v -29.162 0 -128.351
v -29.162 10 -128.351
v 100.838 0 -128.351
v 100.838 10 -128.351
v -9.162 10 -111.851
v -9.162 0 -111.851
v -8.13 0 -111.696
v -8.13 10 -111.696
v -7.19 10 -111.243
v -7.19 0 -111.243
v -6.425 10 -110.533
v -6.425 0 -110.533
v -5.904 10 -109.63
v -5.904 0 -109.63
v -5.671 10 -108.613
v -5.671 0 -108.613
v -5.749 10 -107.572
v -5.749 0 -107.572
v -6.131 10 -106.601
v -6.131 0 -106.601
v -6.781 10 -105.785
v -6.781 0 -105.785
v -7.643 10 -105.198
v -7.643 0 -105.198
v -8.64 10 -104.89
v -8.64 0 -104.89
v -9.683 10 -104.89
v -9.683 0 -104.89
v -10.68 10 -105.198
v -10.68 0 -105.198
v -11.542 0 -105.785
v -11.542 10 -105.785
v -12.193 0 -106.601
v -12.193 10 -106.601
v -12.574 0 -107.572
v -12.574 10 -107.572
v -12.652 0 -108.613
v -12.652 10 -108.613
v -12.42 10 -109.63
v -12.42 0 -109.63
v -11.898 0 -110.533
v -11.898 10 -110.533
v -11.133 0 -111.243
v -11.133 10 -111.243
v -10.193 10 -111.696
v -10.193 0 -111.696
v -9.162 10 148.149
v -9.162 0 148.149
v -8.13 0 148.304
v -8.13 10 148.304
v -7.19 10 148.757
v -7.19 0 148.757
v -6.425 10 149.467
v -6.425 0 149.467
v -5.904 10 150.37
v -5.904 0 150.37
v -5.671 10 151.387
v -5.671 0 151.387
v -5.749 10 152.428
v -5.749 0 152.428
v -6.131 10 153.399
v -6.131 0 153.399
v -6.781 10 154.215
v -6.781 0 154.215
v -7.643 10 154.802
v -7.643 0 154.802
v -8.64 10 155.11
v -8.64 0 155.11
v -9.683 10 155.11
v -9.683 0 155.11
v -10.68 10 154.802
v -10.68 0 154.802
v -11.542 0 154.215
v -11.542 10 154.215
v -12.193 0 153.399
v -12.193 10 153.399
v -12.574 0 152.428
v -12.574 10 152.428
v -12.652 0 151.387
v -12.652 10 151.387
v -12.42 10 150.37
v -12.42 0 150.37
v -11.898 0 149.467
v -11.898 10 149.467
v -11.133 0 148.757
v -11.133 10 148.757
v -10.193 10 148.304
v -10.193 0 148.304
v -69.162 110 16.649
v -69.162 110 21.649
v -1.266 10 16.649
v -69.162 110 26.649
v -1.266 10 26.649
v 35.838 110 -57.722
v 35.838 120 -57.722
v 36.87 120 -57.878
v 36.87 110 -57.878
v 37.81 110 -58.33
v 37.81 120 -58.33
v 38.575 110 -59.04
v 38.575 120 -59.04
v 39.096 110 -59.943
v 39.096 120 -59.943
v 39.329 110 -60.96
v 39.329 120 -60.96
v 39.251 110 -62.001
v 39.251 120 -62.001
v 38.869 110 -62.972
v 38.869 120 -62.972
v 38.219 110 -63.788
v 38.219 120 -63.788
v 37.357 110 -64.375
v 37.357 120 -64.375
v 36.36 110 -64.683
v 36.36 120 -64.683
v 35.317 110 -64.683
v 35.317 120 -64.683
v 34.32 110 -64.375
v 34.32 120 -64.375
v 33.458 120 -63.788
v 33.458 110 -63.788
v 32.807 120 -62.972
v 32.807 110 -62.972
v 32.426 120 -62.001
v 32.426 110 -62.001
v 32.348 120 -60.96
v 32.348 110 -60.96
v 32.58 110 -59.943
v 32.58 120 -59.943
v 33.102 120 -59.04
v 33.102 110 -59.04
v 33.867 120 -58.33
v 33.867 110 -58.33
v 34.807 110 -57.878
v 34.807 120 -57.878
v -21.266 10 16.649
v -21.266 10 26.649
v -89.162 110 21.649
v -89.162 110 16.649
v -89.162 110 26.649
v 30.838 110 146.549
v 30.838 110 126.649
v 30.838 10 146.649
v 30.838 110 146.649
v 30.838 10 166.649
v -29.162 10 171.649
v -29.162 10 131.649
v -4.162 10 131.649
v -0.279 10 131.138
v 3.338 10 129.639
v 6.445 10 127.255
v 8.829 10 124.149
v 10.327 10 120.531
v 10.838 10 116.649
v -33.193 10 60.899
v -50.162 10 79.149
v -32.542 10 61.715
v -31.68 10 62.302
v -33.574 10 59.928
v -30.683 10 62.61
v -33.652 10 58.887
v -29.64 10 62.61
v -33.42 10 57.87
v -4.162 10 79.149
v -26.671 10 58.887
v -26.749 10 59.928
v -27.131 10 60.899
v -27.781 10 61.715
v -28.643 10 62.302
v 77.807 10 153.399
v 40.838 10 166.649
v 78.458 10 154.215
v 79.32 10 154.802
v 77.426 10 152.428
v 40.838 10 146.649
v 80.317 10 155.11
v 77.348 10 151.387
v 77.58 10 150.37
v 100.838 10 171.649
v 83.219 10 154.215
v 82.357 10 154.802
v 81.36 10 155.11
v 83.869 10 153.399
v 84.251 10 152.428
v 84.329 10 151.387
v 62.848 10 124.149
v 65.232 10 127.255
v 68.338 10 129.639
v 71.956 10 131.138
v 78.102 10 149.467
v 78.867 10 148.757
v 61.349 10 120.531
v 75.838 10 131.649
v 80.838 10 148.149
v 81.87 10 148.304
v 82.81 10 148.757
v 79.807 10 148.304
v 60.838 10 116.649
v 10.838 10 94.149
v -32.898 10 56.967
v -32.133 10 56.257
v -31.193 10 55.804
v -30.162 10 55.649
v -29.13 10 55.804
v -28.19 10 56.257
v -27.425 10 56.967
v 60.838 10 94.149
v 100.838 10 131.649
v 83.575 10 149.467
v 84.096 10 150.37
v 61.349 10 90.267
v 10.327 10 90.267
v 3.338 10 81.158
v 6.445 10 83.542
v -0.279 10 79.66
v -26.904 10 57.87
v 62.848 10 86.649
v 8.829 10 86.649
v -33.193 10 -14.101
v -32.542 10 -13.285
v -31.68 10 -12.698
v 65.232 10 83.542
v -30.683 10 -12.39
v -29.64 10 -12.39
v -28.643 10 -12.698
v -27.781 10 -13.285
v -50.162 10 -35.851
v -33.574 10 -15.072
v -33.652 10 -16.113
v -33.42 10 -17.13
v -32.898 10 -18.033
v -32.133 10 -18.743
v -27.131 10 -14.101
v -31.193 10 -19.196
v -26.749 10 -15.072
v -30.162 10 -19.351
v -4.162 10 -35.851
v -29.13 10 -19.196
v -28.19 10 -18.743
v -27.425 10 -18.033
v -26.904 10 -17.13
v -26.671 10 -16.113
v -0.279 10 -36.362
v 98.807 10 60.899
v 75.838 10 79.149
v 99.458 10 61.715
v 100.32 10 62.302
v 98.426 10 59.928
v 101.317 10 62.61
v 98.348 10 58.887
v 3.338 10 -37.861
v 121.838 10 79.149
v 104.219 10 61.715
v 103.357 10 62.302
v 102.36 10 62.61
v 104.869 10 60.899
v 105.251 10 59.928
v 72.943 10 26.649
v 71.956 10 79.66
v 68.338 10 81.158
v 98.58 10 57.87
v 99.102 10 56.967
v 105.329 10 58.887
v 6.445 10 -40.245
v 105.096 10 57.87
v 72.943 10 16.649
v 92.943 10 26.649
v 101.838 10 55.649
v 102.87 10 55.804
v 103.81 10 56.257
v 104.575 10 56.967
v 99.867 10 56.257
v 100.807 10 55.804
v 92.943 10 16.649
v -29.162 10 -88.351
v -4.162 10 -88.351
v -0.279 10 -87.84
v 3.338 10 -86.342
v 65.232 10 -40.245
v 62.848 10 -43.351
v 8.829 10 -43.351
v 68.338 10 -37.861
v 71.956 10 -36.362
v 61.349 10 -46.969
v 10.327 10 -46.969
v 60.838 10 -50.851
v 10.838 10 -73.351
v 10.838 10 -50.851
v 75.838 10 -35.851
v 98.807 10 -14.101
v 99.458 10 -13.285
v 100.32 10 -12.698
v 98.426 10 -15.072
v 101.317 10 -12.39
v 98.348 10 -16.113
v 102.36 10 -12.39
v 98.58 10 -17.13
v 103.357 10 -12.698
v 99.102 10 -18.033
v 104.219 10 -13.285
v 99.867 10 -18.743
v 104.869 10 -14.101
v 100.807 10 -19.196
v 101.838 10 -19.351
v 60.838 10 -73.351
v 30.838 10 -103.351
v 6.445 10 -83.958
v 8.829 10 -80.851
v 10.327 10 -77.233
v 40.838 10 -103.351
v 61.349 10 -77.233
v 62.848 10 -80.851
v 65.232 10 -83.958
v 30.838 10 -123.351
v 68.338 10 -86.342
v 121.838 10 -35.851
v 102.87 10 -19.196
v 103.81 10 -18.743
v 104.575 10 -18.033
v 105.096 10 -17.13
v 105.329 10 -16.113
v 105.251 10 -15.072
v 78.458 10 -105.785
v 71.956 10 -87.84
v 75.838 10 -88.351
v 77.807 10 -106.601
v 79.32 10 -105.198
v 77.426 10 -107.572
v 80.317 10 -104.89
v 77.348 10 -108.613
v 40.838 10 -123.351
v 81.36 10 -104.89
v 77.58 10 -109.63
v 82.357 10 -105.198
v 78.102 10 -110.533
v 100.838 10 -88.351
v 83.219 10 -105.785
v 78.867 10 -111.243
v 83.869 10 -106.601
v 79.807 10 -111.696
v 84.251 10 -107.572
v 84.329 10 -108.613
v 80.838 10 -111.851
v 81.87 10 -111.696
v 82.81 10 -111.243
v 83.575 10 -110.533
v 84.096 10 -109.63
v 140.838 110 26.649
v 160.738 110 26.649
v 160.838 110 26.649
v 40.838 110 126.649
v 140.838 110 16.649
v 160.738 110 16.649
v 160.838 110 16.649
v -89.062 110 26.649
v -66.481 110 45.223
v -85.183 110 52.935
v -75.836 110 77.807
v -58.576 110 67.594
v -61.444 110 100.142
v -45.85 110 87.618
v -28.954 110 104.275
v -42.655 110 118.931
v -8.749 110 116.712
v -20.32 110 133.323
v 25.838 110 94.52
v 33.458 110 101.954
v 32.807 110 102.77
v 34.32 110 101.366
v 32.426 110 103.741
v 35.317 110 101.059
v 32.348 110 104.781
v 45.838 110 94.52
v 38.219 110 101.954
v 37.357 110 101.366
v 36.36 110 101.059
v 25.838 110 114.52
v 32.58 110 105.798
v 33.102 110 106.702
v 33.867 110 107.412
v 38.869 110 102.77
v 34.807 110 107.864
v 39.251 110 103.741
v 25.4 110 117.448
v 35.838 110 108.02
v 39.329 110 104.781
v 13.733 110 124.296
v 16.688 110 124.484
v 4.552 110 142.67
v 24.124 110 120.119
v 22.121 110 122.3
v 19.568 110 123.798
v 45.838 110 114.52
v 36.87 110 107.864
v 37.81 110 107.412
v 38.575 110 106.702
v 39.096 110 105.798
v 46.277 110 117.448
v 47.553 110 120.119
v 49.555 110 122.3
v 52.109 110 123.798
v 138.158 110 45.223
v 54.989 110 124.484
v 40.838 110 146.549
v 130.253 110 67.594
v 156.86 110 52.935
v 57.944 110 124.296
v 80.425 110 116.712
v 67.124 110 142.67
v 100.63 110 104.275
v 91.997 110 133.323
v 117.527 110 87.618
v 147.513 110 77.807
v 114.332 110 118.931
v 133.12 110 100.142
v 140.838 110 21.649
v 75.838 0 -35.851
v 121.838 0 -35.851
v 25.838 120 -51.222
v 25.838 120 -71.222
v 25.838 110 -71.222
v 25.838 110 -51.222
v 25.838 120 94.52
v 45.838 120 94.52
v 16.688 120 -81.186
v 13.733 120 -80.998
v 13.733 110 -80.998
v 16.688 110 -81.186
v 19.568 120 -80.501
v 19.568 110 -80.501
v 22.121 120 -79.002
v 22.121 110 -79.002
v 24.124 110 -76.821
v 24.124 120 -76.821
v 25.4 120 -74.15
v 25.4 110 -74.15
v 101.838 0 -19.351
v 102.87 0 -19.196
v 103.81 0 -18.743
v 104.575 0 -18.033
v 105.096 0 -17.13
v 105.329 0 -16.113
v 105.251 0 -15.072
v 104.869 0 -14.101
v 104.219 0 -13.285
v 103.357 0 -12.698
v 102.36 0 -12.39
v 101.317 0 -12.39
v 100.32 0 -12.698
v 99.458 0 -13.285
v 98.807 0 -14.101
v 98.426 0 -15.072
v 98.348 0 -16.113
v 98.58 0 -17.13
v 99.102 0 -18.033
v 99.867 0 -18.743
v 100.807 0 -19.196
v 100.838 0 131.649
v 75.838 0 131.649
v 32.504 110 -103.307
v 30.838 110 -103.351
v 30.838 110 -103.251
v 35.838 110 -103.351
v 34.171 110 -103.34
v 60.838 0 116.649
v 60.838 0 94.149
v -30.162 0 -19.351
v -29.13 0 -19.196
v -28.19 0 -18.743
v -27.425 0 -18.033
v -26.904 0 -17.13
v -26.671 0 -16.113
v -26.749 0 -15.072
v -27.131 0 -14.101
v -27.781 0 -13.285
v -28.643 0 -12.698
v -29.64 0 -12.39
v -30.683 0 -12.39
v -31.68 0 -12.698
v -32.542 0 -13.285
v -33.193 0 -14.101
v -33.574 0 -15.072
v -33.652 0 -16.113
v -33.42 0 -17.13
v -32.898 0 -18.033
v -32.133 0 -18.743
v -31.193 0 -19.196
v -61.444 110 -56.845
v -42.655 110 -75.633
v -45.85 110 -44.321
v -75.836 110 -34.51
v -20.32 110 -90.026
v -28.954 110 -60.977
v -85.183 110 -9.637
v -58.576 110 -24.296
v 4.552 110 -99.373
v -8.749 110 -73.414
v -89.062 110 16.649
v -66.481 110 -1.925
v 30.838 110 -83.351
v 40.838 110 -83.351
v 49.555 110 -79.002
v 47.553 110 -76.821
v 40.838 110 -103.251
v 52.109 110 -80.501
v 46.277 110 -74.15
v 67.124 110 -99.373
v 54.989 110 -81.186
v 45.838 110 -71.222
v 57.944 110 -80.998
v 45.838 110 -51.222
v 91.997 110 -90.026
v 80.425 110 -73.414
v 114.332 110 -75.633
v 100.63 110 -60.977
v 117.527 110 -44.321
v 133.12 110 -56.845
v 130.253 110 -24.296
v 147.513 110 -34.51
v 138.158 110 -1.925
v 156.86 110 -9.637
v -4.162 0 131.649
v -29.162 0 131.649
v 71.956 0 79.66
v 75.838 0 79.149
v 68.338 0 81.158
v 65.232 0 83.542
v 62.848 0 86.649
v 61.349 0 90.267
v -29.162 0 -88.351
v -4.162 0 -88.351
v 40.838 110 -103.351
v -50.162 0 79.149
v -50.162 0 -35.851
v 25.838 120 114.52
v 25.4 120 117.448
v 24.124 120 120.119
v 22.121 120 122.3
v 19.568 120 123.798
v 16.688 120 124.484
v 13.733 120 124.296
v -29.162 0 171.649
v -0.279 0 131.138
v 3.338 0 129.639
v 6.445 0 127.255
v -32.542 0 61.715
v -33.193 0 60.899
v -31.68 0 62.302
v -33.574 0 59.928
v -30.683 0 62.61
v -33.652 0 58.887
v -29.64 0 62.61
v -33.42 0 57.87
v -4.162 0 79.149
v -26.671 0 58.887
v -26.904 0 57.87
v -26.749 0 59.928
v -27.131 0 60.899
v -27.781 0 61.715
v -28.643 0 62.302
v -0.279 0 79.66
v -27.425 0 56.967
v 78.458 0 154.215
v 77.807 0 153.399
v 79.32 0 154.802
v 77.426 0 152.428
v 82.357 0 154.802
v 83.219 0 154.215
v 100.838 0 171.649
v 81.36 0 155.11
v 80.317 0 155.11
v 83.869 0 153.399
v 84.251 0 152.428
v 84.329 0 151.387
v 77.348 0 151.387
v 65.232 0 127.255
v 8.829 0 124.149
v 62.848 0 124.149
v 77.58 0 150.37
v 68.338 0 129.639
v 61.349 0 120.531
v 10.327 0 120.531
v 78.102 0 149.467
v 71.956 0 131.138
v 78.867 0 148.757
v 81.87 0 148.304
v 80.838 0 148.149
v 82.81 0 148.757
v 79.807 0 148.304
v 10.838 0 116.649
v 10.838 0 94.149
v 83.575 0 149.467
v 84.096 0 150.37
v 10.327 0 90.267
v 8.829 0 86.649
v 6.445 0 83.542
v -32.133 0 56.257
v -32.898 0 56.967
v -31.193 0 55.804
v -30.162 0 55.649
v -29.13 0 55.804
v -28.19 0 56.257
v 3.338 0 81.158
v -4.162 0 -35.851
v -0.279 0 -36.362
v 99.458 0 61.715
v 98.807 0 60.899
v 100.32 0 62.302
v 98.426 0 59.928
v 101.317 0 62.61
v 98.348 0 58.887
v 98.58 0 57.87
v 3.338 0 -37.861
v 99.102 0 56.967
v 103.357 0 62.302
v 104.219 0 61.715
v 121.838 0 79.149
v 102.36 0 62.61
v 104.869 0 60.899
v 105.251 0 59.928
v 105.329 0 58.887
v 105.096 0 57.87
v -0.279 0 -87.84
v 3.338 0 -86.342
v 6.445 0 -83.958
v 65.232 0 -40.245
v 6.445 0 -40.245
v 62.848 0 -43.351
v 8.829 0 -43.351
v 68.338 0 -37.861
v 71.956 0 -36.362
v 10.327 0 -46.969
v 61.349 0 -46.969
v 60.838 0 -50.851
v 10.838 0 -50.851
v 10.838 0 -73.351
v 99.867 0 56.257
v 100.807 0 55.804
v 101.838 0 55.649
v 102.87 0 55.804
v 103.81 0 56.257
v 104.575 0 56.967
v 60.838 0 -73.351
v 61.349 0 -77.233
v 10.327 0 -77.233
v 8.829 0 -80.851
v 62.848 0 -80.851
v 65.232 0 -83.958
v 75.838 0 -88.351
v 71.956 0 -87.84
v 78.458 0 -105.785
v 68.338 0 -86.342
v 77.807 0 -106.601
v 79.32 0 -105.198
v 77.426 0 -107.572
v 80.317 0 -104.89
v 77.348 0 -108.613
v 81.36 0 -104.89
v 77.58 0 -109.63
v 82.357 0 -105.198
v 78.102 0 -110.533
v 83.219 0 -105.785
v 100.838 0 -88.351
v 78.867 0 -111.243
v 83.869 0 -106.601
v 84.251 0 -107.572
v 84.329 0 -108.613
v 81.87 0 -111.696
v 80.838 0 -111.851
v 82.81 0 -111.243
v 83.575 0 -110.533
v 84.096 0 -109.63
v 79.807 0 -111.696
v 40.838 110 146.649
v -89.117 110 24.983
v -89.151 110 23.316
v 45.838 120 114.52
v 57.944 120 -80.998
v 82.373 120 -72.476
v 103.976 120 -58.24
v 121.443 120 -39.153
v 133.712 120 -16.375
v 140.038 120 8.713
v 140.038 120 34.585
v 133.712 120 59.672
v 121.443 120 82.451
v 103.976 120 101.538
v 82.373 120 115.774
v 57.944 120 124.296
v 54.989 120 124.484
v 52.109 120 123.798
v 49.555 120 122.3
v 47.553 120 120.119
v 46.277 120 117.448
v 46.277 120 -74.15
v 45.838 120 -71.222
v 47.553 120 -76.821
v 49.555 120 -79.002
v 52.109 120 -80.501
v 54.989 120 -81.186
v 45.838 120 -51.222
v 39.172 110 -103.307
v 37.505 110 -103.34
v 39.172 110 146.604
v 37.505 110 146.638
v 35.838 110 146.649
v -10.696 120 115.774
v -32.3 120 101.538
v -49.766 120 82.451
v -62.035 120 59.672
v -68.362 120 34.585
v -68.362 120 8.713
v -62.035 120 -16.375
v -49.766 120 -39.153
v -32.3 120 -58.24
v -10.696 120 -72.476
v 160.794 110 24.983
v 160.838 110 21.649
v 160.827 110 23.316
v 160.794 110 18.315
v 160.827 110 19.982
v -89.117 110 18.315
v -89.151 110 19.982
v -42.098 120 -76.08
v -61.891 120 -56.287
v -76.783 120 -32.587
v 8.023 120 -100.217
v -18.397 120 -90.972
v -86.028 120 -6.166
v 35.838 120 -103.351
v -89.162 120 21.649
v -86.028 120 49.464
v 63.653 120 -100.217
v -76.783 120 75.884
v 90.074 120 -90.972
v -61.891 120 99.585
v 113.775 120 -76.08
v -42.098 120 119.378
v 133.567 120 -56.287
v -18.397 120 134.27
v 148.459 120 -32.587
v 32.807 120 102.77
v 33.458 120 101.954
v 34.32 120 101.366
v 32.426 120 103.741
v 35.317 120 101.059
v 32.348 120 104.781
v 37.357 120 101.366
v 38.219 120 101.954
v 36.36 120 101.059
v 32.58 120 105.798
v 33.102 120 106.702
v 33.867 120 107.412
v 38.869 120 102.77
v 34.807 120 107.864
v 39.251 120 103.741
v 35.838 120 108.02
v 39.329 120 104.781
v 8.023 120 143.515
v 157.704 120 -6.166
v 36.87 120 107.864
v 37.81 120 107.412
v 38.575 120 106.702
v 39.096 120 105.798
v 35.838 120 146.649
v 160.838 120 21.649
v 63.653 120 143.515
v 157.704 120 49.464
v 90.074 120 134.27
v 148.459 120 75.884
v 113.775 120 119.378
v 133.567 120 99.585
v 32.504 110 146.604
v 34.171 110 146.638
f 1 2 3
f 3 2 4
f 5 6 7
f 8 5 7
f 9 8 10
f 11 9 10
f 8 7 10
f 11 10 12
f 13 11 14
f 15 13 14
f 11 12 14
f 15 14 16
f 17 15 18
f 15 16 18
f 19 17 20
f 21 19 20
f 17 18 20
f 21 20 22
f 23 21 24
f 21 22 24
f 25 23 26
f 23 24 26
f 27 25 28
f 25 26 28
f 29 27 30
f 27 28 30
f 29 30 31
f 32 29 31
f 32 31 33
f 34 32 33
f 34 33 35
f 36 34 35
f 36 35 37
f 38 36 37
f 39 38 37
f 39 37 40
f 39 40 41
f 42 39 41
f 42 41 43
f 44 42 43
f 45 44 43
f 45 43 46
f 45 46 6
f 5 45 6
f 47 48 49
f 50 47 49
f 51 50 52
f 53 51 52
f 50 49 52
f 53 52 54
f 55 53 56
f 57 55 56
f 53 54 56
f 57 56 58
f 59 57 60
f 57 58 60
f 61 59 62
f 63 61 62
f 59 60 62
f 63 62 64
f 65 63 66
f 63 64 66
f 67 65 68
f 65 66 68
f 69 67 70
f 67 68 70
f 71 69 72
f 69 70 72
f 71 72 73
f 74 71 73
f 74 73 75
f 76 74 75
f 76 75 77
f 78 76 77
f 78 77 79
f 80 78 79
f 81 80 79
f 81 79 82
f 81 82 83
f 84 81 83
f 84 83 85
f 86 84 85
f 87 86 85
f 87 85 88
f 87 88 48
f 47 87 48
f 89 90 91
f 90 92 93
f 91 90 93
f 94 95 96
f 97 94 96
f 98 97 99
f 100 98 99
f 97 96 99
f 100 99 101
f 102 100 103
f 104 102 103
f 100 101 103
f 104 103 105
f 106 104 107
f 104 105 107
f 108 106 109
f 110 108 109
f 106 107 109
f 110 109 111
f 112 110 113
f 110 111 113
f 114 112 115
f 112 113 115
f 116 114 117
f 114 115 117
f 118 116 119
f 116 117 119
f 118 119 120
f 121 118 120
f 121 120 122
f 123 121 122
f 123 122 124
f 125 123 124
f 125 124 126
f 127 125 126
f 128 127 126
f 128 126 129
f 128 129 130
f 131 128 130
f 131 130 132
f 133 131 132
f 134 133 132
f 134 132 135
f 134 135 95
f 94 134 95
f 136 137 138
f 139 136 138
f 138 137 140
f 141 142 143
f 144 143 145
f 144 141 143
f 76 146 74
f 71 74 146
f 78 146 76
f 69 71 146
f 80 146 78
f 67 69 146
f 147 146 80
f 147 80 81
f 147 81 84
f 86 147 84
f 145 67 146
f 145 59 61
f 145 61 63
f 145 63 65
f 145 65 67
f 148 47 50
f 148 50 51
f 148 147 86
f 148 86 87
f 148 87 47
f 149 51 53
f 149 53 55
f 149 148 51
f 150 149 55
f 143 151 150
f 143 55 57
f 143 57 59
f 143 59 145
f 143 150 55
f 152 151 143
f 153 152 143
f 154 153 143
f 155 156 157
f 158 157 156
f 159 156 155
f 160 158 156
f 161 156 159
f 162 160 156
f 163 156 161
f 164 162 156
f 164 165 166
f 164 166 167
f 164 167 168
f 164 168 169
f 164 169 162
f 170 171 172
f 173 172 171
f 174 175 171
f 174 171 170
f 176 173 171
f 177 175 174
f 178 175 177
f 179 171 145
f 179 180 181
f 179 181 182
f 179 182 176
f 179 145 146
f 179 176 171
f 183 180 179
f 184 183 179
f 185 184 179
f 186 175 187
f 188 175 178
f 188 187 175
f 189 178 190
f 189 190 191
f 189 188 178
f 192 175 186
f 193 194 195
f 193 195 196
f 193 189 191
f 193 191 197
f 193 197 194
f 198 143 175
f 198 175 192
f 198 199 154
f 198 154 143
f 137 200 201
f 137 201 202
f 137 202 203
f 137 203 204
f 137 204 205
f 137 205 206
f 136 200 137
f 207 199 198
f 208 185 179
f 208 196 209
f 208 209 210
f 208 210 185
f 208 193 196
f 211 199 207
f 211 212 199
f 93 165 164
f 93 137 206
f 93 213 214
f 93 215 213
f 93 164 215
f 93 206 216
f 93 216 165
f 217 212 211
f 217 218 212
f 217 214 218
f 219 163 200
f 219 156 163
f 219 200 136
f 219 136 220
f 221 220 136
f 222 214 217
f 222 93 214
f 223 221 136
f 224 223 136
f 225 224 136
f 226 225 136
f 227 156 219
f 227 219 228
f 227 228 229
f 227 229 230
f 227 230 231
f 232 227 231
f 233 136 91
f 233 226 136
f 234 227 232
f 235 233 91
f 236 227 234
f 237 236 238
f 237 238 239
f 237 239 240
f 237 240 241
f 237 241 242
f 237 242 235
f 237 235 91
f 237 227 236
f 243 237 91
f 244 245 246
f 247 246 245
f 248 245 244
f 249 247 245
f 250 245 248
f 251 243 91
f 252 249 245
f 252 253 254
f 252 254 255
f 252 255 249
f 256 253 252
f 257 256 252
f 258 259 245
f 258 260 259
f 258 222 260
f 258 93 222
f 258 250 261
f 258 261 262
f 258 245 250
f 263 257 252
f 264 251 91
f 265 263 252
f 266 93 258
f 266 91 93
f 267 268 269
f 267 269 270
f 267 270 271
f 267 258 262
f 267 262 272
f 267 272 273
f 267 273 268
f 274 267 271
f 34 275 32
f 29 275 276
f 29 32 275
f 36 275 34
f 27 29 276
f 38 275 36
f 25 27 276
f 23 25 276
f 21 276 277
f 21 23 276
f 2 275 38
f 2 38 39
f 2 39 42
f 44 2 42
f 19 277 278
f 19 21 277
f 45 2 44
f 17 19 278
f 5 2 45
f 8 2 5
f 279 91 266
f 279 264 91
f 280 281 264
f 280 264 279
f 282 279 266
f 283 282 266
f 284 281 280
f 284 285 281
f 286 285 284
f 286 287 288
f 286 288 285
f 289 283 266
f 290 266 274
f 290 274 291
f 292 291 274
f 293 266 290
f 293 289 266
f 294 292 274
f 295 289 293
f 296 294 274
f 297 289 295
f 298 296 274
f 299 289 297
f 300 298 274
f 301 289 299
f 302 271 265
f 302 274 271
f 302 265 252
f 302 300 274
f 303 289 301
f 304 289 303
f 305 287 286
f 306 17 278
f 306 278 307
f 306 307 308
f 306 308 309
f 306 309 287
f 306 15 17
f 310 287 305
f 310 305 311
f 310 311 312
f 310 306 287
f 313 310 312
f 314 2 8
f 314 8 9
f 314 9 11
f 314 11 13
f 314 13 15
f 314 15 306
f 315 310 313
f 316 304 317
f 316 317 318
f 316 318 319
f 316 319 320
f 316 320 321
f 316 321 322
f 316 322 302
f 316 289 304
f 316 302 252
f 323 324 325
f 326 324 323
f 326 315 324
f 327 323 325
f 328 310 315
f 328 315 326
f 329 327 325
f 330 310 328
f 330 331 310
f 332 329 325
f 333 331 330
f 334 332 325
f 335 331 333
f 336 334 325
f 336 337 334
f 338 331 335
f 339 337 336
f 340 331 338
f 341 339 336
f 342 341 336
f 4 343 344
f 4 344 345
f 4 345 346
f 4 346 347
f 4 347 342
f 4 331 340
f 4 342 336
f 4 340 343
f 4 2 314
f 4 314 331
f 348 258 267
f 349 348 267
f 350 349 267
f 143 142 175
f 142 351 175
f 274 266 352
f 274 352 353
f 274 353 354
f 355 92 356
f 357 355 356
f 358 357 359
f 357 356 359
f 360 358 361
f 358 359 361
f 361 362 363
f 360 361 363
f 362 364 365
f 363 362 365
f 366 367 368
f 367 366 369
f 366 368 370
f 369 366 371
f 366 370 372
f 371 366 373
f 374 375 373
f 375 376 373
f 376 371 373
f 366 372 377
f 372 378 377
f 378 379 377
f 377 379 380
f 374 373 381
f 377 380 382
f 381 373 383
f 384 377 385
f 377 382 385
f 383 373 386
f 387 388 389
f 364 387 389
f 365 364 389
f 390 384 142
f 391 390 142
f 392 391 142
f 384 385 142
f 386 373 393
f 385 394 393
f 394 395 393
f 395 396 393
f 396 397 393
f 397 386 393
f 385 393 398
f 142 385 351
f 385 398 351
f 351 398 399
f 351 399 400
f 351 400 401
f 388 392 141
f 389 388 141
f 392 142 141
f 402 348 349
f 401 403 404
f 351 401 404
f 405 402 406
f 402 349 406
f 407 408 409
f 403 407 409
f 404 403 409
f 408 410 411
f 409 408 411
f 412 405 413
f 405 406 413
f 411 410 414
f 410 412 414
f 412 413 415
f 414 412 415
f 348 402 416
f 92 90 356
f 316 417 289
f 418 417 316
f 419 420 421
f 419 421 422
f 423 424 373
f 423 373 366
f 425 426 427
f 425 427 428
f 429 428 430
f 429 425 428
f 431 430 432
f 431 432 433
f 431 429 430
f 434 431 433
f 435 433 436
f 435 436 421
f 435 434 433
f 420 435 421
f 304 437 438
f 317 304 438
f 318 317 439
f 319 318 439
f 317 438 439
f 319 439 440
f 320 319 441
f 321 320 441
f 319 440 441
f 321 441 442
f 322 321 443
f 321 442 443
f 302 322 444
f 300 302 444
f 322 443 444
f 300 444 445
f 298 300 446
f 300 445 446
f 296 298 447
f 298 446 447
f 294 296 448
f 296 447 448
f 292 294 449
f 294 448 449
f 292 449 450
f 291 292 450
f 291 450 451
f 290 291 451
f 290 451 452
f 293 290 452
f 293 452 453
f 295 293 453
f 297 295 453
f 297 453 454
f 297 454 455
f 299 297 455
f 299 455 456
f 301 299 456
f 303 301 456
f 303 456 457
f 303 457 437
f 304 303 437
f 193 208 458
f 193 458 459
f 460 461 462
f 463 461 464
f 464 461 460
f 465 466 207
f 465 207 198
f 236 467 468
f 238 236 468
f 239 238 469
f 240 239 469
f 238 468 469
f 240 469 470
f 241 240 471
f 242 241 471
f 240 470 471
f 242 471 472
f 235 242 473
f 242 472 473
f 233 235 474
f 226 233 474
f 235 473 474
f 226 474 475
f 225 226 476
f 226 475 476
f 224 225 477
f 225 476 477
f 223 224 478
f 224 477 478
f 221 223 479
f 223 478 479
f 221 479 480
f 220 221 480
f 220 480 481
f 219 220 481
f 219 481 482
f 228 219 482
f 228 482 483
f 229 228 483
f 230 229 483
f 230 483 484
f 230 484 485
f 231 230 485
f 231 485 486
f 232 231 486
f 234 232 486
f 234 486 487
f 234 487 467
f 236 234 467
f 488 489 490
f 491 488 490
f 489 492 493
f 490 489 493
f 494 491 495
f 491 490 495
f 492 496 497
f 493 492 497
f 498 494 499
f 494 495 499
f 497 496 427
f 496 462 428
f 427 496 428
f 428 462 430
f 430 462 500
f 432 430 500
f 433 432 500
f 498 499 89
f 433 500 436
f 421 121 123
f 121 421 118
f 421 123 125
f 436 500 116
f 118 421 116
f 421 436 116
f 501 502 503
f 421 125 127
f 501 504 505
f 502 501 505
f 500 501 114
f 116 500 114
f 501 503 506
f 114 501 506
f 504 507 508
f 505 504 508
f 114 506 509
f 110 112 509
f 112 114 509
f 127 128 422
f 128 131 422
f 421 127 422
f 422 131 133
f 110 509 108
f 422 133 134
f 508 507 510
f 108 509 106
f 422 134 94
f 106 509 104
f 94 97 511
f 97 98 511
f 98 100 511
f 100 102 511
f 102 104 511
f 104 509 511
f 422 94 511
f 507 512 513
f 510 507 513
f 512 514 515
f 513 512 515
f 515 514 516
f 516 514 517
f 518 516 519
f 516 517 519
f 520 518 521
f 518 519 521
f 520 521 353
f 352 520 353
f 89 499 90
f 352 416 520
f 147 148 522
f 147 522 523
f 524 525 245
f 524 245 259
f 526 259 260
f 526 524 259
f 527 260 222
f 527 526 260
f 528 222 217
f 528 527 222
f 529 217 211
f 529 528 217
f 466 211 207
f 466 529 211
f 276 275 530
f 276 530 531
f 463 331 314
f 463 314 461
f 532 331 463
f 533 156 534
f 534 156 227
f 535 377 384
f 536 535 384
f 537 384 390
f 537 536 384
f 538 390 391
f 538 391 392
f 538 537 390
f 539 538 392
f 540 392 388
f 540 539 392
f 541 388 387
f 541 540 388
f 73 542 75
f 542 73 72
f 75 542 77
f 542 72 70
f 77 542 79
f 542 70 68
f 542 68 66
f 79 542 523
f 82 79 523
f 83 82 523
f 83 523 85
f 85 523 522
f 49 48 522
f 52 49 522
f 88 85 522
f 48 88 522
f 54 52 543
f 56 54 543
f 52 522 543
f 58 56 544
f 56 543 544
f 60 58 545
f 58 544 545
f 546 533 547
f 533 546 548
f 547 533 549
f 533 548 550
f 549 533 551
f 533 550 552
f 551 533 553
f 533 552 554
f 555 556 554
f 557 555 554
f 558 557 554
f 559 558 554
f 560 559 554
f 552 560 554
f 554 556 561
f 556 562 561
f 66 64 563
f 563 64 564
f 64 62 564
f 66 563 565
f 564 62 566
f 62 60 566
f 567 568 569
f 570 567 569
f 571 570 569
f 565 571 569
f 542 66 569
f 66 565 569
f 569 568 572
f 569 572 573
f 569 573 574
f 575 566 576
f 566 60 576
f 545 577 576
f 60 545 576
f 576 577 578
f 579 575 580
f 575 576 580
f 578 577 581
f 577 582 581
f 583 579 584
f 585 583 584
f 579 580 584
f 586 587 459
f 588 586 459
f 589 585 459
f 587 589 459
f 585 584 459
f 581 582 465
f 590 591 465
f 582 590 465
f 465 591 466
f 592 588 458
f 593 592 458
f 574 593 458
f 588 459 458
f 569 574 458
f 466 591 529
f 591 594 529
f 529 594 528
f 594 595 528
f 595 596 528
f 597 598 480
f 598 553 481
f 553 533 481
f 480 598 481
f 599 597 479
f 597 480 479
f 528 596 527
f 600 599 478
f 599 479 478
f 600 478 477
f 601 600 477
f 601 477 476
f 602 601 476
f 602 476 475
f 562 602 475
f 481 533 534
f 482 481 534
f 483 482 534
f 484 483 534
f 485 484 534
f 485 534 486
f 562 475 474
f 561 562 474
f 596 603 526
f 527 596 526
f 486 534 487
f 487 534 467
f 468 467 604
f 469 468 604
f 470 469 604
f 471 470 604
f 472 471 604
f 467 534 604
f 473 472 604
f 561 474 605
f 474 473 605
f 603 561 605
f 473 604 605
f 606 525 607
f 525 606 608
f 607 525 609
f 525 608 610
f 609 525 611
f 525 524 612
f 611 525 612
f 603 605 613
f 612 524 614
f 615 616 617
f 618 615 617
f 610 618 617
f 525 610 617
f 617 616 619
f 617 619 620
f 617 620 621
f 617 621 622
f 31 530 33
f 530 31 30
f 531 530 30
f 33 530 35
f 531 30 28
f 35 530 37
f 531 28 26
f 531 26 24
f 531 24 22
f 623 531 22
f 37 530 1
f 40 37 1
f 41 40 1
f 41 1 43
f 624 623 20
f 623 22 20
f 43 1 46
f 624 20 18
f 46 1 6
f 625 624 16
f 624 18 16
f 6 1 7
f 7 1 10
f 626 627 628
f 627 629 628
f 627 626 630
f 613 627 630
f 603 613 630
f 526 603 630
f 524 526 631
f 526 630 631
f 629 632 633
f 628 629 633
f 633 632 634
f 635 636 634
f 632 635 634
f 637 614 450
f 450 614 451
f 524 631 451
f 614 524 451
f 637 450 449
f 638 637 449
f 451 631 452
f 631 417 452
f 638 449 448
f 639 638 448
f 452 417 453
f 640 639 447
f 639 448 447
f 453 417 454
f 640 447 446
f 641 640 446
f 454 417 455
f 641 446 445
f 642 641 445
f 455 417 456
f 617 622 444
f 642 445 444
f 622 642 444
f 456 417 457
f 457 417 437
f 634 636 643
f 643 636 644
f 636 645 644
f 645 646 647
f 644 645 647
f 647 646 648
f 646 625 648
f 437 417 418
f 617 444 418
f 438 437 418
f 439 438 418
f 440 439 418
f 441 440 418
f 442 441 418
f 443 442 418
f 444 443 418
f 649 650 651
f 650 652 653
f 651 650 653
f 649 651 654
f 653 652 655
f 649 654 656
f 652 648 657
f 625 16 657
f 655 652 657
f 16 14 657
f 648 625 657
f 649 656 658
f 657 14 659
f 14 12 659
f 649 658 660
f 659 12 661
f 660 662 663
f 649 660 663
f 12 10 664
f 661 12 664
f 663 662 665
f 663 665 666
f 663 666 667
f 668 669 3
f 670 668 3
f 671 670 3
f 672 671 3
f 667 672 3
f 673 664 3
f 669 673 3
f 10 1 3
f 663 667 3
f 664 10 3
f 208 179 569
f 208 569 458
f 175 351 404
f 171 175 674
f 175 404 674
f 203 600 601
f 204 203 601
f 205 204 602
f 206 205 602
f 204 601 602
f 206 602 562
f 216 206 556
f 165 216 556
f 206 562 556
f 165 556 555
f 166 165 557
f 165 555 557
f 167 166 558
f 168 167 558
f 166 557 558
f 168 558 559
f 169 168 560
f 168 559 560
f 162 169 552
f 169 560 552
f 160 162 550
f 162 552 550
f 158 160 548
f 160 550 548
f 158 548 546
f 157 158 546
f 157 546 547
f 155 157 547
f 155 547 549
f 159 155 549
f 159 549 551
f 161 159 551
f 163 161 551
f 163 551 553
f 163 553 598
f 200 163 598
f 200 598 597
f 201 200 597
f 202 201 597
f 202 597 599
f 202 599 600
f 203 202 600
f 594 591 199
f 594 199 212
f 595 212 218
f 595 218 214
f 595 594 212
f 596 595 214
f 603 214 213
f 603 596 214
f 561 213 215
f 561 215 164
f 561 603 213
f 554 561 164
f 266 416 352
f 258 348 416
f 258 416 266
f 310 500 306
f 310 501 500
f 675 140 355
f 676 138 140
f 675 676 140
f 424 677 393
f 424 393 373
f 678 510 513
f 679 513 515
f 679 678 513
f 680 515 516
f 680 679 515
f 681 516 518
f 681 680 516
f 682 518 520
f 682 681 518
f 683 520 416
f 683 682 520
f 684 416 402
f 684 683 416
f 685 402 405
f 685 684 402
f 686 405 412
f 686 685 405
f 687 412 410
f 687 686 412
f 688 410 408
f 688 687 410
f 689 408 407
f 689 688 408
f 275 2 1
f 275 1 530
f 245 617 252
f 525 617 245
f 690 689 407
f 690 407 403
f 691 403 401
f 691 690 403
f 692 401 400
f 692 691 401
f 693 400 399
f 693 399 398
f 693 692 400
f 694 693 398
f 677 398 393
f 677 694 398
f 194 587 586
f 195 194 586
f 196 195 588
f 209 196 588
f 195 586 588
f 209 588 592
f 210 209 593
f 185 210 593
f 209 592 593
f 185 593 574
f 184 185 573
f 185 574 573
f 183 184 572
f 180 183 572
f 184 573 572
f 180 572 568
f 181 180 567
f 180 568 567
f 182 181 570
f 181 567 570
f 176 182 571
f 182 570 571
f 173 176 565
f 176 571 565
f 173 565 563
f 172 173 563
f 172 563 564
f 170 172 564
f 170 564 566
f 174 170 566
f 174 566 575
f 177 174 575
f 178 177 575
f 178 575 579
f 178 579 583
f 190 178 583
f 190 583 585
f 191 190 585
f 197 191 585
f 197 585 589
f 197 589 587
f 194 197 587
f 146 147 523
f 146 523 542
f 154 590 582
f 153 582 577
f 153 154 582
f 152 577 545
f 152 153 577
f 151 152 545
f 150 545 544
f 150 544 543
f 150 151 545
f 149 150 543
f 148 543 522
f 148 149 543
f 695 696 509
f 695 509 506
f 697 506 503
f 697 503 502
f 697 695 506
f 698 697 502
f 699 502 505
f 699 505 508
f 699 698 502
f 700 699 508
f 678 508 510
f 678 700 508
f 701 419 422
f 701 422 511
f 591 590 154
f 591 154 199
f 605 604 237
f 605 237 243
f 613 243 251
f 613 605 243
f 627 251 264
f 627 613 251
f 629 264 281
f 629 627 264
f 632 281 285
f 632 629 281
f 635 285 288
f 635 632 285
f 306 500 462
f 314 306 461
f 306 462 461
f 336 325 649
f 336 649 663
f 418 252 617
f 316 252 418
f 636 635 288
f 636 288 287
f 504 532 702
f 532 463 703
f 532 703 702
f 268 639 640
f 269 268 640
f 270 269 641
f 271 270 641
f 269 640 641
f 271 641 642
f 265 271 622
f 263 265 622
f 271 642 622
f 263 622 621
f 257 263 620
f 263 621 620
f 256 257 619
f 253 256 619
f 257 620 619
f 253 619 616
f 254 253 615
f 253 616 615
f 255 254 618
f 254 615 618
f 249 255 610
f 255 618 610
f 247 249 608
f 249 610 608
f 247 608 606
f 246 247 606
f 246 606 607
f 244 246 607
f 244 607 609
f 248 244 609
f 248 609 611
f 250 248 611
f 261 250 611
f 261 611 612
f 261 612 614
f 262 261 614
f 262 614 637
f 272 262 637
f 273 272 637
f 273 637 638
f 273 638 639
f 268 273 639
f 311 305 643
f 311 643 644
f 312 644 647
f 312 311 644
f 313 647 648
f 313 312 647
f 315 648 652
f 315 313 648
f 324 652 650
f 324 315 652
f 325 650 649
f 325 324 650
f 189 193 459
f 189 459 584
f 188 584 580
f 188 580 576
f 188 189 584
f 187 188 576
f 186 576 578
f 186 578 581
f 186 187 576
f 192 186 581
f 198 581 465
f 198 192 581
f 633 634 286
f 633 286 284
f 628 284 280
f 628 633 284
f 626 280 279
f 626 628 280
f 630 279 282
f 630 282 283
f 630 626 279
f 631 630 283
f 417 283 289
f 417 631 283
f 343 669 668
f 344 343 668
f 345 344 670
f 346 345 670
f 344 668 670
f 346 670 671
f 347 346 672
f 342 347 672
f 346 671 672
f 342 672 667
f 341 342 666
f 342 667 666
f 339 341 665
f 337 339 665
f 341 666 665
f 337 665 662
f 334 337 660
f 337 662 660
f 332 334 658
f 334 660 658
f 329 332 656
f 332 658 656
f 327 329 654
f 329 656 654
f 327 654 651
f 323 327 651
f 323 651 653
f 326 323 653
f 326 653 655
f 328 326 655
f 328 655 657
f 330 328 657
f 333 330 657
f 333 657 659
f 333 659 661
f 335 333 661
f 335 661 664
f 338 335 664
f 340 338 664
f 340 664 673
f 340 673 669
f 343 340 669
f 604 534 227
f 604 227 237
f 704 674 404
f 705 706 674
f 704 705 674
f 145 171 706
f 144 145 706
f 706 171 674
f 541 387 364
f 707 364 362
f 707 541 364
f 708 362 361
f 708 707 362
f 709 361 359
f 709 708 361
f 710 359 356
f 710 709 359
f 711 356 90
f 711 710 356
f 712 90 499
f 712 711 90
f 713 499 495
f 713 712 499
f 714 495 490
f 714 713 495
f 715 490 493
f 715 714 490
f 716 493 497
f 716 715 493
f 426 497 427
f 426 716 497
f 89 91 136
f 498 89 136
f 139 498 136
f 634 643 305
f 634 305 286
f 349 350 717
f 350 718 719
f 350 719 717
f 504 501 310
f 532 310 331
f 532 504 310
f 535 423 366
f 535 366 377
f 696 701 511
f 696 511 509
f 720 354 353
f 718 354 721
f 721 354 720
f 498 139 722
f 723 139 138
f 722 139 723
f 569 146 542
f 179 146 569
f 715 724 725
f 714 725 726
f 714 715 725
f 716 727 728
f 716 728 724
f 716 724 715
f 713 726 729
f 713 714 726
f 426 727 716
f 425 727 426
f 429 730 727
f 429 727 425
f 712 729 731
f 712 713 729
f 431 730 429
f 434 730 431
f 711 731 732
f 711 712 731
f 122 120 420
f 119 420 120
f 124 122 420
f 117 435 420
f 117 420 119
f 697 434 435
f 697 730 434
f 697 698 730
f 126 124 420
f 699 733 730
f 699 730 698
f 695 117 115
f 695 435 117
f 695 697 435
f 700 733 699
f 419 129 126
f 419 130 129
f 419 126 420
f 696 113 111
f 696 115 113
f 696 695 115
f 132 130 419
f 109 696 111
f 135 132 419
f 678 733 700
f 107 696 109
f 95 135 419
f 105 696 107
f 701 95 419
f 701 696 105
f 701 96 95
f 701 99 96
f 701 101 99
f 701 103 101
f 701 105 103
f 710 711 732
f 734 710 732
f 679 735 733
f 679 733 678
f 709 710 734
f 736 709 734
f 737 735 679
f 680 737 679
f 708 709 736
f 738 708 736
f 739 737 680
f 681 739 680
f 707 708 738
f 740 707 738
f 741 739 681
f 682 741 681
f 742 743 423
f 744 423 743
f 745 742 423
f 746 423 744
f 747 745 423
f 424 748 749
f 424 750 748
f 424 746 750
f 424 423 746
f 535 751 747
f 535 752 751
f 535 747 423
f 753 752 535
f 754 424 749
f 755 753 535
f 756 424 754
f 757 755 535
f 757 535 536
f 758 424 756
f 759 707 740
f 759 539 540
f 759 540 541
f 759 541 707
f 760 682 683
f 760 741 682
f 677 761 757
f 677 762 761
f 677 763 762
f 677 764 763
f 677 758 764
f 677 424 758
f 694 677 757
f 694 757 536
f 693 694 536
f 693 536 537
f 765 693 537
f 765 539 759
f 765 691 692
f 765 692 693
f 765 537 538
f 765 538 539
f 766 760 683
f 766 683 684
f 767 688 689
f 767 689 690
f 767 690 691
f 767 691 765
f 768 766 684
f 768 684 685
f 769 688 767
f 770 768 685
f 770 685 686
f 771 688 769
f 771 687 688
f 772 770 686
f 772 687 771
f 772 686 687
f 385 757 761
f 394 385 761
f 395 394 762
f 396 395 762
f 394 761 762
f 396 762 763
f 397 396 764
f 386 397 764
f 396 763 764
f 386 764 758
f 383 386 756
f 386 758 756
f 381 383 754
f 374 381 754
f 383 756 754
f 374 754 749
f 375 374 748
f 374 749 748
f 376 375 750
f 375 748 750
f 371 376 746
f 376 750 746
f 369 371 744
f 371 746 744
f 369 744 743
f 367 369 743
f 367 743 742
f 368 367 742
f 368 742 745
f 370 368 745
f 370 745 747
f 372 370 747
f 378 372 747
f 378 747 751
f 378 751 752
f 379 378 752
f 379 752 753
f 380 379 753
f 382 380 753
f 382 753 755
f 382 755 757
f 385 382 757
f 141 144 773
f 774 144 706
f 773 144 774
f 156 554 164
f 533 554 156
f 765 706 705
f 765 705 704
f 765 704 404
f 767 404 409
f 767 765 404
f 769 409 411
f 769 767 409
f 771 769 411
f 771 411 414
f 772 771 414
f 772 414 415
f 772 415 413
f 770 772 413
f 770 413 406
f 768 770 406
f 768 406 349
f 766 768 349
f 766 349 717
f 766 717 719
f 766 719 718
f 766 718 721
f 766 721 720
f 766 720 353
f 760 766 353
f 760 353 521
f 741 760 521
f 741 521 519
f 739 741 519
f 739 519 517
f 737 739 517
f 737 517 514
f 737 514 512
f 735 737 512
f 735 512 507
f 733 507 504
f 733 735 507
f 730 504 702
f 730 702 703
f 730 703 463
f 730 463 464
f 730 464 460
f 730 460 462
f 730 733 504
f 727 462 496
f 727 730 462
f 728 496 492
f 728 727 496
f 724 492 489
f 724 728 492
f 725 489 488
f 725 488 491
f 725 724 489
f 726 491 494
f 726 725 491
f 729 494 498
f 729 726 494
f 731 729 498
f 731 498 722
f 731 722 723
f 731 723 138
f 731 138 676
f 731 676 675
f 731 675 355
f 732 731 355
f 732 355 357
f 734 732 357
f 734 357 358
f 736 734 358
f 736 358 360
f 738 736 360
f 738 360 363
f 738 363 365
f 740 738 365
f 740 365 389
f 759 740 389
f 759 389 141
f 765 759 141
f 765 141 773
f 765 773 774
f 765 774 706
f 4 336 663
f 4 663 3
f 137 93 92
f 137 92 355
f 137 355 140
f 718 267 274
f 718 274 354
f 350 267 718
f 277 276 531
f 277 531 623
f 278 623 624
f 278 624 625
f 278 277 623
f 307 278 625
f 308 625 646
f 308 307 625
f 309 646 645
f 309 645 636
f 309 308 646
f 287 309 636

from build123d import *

# Parameters (mm, degrees)
AUFSATZ_LINEAR_AUSTRAGEN1_DEPTH    = 10
SKIZZE6_R                          = 125
AUFSATZ_LINEAR_AUSTRAGEN2_DEPTH    = 10
AUFSATZ_LINEAR_AUSTRAGEN3_DEPTH    = 5
SKIZZE8_W                          = 50
SKIZZE8_H                          = 20
SCHNITT_LINEAR_AUSTRAGEN1_DEPTH    = 10
AUFSATZ_LINEAR_AUSTRAGEN4_DEPTH    = 10
SKIZZE14_W                         = 24
SKIZZE14_H                         = 115
SCHNITT_LINEAR_AUSTRAGEN2_DEPTH    = 10
SKIZZE15_W                         = 24
SKIZZE15_H                         = 115
SCHNITT_LINEAR_AUSTRAGEN3_DEPTH    = 10
AUFSATZ_LINEAR_AUSTRAGEN8_DEPTH    = 5
KERNLOCH_F_R_M8X1_0_GEWINDE2_D     = 7
KERNLOCH_F_R_M8X1_0_GEWINDE2_DEPTH = 20
KERNLOCH_F_R_M8X1_0_GEWINDE2_TIP   = 2.103012167
KERNLOCH_F_R_M8X1_0_GEWINDE3_D     = 7
KERNLOCH_F_R_M8X1_0_GEWINDE3_DEPTH = 20
KERNLOCH_F_R_M8X1_0_GEWINDE3_TIP   = 2.103012167


with BuildPart() as part:
    # Skizze1 → Aufsatz-Linear austragen1 (new body)
    with BuildSketch(Plane(origin=(0, 0, 0), x_dir=(1, 0, 0), z_dir=(0, 1, 0))):
        with BuildLine():
            Line((75.838298065, 35.851170731), (145.838298065, 35.851170731))
            Line((145.838298065, 35.851170731), (145.838298065, -79.148829269))
            Line((145.838298065, -79.148829269), (75.838298065, -79.148829269))
            ThreePointArc((75.838298065, -79.148829269), (65.231696347, -83.542227551), (60.838298065, -94.148829269))
            Line((60.838298065, -94.148829269), (60.838298065, -191.648829269))
            Line((60.838298065, -191.648829269), (10.838298065, -191.648829269))
            Line((10.838298065, -191.648829269), (10.838298065, -94.148829269))
            ThreePointArc((10.838298065, -94.148829269), (6.444899783, -83.542227551), (-4.161701935, -79.148829269))
            Line((-4.161701935, -79.148829269), (-74.161701935, -79.148829269))
            Line((-74.161701935, -79.148829269), (-74.161701935, 35.851170731))
            Line((-74.161701935, 35.851170731), (-4.161701935, 35.851170731))
            ThreePointArc((-4.161701935, 35.851170731), (6.444899783, 40.244569014), (10.838298065, 50.851170731))
            Line((10.838298065, 50.851170731), (10.838298065, 148.351170731))
            Line((10.838298065, 148.351170731), (60.838298065, 148.351170731))
            Line((60.838298065, 148.351170731), (60.838298065, 50.851170731))
            ThreePointArc((60.838298065, 50.851170731), (65.231696347, 40.244569014), (75.838298065, 35.851170731))
        make_face()
    extrude(amount=AUFSATZ_LINEAR_AUSTRAGEN1_DEPTH)



with BuildPart() as body_2:
    # Skizze6 → Aufsatz-Linear austragen2 (new body)
    with BuildSketch(Plane(origin=(0, 120, 0), x_dir=(1, 0, 0), z_dir=(0, 1, 0))):
        with Locations(Location((35.838298065, -21.648829269, 0), (0, 0, 270))):  # turned: the seam where the file's is
            Circle(SKIZZE6_R)
        with BuildLine():
            Line((25.838298065, 71.222048837), (25.838298065, 51.222048837))
            Line((25.838298065, 51.222048837), (45.838298065, 51.222048837))
            Line((45.838298065, 51.222048837), (45.838298065, 71.222048837))
            ThreePointArc((45.838298065, 71.222048837), (49.55548944, 79.001914889), (57.943561223, 80.997930742))
            ThreePointArc((57.943561223, 80.997930742), (140.838298065, -21.648829269), (57.943561223, -124.295589279))
            ThreePointArc((57.943561223, -124.295589279), (49.55548944, -122.299573426), (45.838298065, -114.519707374))
            Line((45.838298065, -114.519707374), (45.838298065, -94.519707374))
            Line((45.838298065, -94.519707374), (25.838298065, -94.519707374))
            Line((25.838298065, -94.519707374), (25.838298065, -114.519707374))
            ThreePointArc((25.838298065, -114.519707374), (22.121106689, -122.299573426), (13.733034907, -124.295589279))
            ThreePointArc((13.733034907, -124.295589279), (-69.161701935, -21.648829269), (13.733034907, 80.997930742))
            ThreePointArc((13.733034907, 80.997930742), (22.121106689, 79.001914889), (25.838298065, 71.222048837))
        make_face(mode=Mode.SUBTRACT)
    extrude(amount=-AUFSATZ_LINEAR_AUSTRAGEN2_DEPTH)


with BuildPart() as part_1:
    add(part.part)

    add(body_2.part)  # Aufsatz-Linear austragen3 merges body 2
    # Skizze7 → Aufsatz-Linear austragen3 (add, symmetric)
    with BuildSketch(Plane(origin=(35.838298065, 0, 0), x_dir=(0, 0, -1), z_dir=(1, 0, 0))):
        Polygon((-146.648829269, 110), (-126.648829269, 110), (-146.648829269, 10), (-166.648829269, 10), align=None)
    aufsatz_linear_austragen3 = extrude(amount=AUFSATZ_LINEAR_AUSTRAGEN3_DEPTH, both=True)

    # Spiegeln1: Aufsatz-Linear austragen3 across plane
    add(aufsatz_linear_austragen3.mirror(Plane.XY.offset(21.648829269)))

    # Skizze8 → Schnitt-Linear austragen1 (cut)
    with BuildSketch(Plane(origin=(0, 10, 0), x_dir=(1, 0, 0), z_dir=(0, 1, 0))):
        with Locations((35.838298065, 138.351170731)):
            Rectangle(SKIZZE8_W, SKIZZE8_H)
        with Locations((35.838298065, -181.648829269)):
            Rectangle(SKIZZE8_W, SKIZZE8_H)
    extrude(amount=-SCHNITT_LINEAR_AUSTRAGEN1_DEPTH, mode=Mode.SUBTRACT)

    # Skizze9 → Aufsatz-Linear austragen4 (add)
    with BuildSketch(Plane(origin=(0, 10, 0), x_dir=(1, 0, 0), z_dir=(0, 1, 0))):
        with BuildLine():
            Line((60.838298065, -131.648829269), (60.838298065, -171.648829269))
            Line((60.838298065, -171.648829269), (100.838298065, -171.648829269))
            Line((100.838298065, -171.648829269), (100.838298065, -131.648829269))
            Line((100.838298065, -131.648829269), (75.838298065, -131.648829269))
            ThreePointArc((75.838298065, -131.648829269), (65.231696347, -127.255430986), (60.838298065, -116.648829269))
            Line((60.838298065, -116.648829269), (60.838298065, -131.648829269))
        make_face()
        with BuildLine():
            Line((-29.161701935, -171.648829269), (10.838298065, -171.648829269))
            Line((10.838298065, -171.648829269), (10.838298065, -131.648829269))
            Line((10.838298065, -131.648829269), (10.838298065, -116.648829269))
            ThreePointArc((10.838298065, -116.648829269), (6.444899783, -127.255430986), (-4.161701935, -131.648829269))
            Line((-4.161701935, -131.648829269), (-29.161701935, -131.648829269))
            Line((-29.161701935, -131.648829269), (-29.161701935, -171.648829269))
        make_face()
        with BuildLine():
            Line((100.838298065, 128.351170731), (60.838298065, 128.351170731))
            Line((60.838298065, 128.351170731), (60.838298065, 88.351170731))
            Line((60.838298065, 88.351170731), (60.838298065, 73.351170731))
            ThreePointArc((60.838298065, 73.351170731), (65.231696347, 83.957772449), (75.838298065, 88.351170731))
            Line((75.838298065, 88.351170731), (100.838298065, 88.351170731))
            Line((100.838298065, 88.351170731), (100.838298065, 128.351170731))
        make_face()
        with BuildLine():
            Line((10.838298065, 88.351170731), (10.838298065, 128.351170731))
            Line((10.838298065, 128.351170731), (-29.161701935, 128.351170731))
            Line((-29.161701935, 128.351170731), (-29.161701935, 88.351170731))
            Line((-29.161701935, 88.351170731), (-4.161701935, 88.351170731))
            ThreePointArc((-4.161701935, 88.351170731), (6.444899783, 83.957772449), (10.838298065, 73.351170731))
            Line((10.838298065, 73.351170731), (10.838298065, 88.351170731))
        make_face()
    extrude(amount=-AUFSATZ_LINEAR_AUSTRAGEN4_DEPTH)

    # Skizze14 → Schnitt-Linear austragen2 (cut)
    with BuildSketch(Plane(origin=(0, 10, 0), x_dir=(1, 0, 0), z_dir=(0, 1, 0))):
        with Locations((133.838298065, -21.648829269)):
            Rectangle(SKIZZE14_W, SKIZZE14_H)
    extrude(amount=-SCHNITT_LINEAR_AUSTRAGEN2_DEPTH, mode=Mode.SUBTRACT)

    # Skizze15 → Schnitt-Linear austragen3 (cut)
    with BuildSketch(Plane(origin=(0, 10, 0), x_dir=(1, 0, 0), z_dir=(0, 1, 0))):
        with Locations((-62.161701935, -21.648829269)):
            Rectangle(SKIZZE15_W, SKIZZE15_H)
    extrude(amount=-SCHNITT_LINEAR_AUSTRAGEN3_DEPTH, mode=Mode.SUBTRACT)

    # Skizze16 → Aufsatz-Linear austragen8 (add, symmetric)
    with BuildSketch(Plane.XY.offset(21.648829269)):
        Polygon((-89.161701935, 110), (-69.161701935, 110), (0, 8.135310029), (-20, 8.135310029), align=None)
    aufsatz_linear_austragen8 = extrude(amount=AUFSATZ_LINEAR_AUSTRAGEN8_DEPTH, both=True)

    # Spiegeln5: Aufsatz-Linear austragen8 across plane
    add(aufsatz_linear_austragen8.mirror(Plane(origin=(35.838298065, 0, 0), x_dir=(0, 0, 1), z_dir=(1, 0, 0))))

    # Kernloch für M8x1.0 Gewinde2
    with Locations(Plane(origin=(35.838298065, 110, -61.222048837), x_dir=(0, 0, -1), z_dir=(0, -1, 0))):
        with Locations((0, 0), (-165.741756211, 0)):
            Hole(KERNLOCH_F_R_M8X1_0_GEWINDE2_D / 2, depth=KERNLOCH_F_R_M8X1_0_GEWINDE2_DEPTH)
            with Locations((0, 0, -(KERNLOCH_F_R_M8X1_0_GEWINDE2_DEPTH + KERNLOCH_F_R_M8X1_0_GEWINDE2_TIP / 2))):  # 118° drill point
                Cone(0, KERNLOCH_F_R_M8X1_0_GEWINDE2_D / 2, KERNLOCH_F_R_M8X1_0_GEWINDE2_TIP, mode=Mode.SUBTRACT)

    # Kernloch für M8x1.0 Gewinde3
    with Locations(Plane(origin=(101.838298065, 10, -15.851170731), x_dir=(0, 0, 1), z_dir=(0, 1, 0))):
        with Locations((0, 0), (75, 0), (0, -132), (-92.5, -111), (75, -132), (167.5, -111), (167.5, -21), (-92.5, -21)):
            Hole(KERNLOCH_F_R_M8X1_0_GEWINDE3_D / 2, depth=KERNLOCH_F_R_M8X1_0_GEWINDE3_DEPTH)
            with Locations((0, 0, -(KERNLOCH_F_R_M8X1_0_GEWINDE3_DEPTH + KERNLOCH_F_R_M8X1_0_GEWINDE3_TIP / 2))):  # 118° drill point
                Cone(0, KERNLOCH_F_R_M8X1_0_GEWINDE3_D / 2, KERNLOCH_F_R_M8X1_0_GEWINDE3_TIP, mode=Mode.SUBTRACT)


solid = part_1.part
